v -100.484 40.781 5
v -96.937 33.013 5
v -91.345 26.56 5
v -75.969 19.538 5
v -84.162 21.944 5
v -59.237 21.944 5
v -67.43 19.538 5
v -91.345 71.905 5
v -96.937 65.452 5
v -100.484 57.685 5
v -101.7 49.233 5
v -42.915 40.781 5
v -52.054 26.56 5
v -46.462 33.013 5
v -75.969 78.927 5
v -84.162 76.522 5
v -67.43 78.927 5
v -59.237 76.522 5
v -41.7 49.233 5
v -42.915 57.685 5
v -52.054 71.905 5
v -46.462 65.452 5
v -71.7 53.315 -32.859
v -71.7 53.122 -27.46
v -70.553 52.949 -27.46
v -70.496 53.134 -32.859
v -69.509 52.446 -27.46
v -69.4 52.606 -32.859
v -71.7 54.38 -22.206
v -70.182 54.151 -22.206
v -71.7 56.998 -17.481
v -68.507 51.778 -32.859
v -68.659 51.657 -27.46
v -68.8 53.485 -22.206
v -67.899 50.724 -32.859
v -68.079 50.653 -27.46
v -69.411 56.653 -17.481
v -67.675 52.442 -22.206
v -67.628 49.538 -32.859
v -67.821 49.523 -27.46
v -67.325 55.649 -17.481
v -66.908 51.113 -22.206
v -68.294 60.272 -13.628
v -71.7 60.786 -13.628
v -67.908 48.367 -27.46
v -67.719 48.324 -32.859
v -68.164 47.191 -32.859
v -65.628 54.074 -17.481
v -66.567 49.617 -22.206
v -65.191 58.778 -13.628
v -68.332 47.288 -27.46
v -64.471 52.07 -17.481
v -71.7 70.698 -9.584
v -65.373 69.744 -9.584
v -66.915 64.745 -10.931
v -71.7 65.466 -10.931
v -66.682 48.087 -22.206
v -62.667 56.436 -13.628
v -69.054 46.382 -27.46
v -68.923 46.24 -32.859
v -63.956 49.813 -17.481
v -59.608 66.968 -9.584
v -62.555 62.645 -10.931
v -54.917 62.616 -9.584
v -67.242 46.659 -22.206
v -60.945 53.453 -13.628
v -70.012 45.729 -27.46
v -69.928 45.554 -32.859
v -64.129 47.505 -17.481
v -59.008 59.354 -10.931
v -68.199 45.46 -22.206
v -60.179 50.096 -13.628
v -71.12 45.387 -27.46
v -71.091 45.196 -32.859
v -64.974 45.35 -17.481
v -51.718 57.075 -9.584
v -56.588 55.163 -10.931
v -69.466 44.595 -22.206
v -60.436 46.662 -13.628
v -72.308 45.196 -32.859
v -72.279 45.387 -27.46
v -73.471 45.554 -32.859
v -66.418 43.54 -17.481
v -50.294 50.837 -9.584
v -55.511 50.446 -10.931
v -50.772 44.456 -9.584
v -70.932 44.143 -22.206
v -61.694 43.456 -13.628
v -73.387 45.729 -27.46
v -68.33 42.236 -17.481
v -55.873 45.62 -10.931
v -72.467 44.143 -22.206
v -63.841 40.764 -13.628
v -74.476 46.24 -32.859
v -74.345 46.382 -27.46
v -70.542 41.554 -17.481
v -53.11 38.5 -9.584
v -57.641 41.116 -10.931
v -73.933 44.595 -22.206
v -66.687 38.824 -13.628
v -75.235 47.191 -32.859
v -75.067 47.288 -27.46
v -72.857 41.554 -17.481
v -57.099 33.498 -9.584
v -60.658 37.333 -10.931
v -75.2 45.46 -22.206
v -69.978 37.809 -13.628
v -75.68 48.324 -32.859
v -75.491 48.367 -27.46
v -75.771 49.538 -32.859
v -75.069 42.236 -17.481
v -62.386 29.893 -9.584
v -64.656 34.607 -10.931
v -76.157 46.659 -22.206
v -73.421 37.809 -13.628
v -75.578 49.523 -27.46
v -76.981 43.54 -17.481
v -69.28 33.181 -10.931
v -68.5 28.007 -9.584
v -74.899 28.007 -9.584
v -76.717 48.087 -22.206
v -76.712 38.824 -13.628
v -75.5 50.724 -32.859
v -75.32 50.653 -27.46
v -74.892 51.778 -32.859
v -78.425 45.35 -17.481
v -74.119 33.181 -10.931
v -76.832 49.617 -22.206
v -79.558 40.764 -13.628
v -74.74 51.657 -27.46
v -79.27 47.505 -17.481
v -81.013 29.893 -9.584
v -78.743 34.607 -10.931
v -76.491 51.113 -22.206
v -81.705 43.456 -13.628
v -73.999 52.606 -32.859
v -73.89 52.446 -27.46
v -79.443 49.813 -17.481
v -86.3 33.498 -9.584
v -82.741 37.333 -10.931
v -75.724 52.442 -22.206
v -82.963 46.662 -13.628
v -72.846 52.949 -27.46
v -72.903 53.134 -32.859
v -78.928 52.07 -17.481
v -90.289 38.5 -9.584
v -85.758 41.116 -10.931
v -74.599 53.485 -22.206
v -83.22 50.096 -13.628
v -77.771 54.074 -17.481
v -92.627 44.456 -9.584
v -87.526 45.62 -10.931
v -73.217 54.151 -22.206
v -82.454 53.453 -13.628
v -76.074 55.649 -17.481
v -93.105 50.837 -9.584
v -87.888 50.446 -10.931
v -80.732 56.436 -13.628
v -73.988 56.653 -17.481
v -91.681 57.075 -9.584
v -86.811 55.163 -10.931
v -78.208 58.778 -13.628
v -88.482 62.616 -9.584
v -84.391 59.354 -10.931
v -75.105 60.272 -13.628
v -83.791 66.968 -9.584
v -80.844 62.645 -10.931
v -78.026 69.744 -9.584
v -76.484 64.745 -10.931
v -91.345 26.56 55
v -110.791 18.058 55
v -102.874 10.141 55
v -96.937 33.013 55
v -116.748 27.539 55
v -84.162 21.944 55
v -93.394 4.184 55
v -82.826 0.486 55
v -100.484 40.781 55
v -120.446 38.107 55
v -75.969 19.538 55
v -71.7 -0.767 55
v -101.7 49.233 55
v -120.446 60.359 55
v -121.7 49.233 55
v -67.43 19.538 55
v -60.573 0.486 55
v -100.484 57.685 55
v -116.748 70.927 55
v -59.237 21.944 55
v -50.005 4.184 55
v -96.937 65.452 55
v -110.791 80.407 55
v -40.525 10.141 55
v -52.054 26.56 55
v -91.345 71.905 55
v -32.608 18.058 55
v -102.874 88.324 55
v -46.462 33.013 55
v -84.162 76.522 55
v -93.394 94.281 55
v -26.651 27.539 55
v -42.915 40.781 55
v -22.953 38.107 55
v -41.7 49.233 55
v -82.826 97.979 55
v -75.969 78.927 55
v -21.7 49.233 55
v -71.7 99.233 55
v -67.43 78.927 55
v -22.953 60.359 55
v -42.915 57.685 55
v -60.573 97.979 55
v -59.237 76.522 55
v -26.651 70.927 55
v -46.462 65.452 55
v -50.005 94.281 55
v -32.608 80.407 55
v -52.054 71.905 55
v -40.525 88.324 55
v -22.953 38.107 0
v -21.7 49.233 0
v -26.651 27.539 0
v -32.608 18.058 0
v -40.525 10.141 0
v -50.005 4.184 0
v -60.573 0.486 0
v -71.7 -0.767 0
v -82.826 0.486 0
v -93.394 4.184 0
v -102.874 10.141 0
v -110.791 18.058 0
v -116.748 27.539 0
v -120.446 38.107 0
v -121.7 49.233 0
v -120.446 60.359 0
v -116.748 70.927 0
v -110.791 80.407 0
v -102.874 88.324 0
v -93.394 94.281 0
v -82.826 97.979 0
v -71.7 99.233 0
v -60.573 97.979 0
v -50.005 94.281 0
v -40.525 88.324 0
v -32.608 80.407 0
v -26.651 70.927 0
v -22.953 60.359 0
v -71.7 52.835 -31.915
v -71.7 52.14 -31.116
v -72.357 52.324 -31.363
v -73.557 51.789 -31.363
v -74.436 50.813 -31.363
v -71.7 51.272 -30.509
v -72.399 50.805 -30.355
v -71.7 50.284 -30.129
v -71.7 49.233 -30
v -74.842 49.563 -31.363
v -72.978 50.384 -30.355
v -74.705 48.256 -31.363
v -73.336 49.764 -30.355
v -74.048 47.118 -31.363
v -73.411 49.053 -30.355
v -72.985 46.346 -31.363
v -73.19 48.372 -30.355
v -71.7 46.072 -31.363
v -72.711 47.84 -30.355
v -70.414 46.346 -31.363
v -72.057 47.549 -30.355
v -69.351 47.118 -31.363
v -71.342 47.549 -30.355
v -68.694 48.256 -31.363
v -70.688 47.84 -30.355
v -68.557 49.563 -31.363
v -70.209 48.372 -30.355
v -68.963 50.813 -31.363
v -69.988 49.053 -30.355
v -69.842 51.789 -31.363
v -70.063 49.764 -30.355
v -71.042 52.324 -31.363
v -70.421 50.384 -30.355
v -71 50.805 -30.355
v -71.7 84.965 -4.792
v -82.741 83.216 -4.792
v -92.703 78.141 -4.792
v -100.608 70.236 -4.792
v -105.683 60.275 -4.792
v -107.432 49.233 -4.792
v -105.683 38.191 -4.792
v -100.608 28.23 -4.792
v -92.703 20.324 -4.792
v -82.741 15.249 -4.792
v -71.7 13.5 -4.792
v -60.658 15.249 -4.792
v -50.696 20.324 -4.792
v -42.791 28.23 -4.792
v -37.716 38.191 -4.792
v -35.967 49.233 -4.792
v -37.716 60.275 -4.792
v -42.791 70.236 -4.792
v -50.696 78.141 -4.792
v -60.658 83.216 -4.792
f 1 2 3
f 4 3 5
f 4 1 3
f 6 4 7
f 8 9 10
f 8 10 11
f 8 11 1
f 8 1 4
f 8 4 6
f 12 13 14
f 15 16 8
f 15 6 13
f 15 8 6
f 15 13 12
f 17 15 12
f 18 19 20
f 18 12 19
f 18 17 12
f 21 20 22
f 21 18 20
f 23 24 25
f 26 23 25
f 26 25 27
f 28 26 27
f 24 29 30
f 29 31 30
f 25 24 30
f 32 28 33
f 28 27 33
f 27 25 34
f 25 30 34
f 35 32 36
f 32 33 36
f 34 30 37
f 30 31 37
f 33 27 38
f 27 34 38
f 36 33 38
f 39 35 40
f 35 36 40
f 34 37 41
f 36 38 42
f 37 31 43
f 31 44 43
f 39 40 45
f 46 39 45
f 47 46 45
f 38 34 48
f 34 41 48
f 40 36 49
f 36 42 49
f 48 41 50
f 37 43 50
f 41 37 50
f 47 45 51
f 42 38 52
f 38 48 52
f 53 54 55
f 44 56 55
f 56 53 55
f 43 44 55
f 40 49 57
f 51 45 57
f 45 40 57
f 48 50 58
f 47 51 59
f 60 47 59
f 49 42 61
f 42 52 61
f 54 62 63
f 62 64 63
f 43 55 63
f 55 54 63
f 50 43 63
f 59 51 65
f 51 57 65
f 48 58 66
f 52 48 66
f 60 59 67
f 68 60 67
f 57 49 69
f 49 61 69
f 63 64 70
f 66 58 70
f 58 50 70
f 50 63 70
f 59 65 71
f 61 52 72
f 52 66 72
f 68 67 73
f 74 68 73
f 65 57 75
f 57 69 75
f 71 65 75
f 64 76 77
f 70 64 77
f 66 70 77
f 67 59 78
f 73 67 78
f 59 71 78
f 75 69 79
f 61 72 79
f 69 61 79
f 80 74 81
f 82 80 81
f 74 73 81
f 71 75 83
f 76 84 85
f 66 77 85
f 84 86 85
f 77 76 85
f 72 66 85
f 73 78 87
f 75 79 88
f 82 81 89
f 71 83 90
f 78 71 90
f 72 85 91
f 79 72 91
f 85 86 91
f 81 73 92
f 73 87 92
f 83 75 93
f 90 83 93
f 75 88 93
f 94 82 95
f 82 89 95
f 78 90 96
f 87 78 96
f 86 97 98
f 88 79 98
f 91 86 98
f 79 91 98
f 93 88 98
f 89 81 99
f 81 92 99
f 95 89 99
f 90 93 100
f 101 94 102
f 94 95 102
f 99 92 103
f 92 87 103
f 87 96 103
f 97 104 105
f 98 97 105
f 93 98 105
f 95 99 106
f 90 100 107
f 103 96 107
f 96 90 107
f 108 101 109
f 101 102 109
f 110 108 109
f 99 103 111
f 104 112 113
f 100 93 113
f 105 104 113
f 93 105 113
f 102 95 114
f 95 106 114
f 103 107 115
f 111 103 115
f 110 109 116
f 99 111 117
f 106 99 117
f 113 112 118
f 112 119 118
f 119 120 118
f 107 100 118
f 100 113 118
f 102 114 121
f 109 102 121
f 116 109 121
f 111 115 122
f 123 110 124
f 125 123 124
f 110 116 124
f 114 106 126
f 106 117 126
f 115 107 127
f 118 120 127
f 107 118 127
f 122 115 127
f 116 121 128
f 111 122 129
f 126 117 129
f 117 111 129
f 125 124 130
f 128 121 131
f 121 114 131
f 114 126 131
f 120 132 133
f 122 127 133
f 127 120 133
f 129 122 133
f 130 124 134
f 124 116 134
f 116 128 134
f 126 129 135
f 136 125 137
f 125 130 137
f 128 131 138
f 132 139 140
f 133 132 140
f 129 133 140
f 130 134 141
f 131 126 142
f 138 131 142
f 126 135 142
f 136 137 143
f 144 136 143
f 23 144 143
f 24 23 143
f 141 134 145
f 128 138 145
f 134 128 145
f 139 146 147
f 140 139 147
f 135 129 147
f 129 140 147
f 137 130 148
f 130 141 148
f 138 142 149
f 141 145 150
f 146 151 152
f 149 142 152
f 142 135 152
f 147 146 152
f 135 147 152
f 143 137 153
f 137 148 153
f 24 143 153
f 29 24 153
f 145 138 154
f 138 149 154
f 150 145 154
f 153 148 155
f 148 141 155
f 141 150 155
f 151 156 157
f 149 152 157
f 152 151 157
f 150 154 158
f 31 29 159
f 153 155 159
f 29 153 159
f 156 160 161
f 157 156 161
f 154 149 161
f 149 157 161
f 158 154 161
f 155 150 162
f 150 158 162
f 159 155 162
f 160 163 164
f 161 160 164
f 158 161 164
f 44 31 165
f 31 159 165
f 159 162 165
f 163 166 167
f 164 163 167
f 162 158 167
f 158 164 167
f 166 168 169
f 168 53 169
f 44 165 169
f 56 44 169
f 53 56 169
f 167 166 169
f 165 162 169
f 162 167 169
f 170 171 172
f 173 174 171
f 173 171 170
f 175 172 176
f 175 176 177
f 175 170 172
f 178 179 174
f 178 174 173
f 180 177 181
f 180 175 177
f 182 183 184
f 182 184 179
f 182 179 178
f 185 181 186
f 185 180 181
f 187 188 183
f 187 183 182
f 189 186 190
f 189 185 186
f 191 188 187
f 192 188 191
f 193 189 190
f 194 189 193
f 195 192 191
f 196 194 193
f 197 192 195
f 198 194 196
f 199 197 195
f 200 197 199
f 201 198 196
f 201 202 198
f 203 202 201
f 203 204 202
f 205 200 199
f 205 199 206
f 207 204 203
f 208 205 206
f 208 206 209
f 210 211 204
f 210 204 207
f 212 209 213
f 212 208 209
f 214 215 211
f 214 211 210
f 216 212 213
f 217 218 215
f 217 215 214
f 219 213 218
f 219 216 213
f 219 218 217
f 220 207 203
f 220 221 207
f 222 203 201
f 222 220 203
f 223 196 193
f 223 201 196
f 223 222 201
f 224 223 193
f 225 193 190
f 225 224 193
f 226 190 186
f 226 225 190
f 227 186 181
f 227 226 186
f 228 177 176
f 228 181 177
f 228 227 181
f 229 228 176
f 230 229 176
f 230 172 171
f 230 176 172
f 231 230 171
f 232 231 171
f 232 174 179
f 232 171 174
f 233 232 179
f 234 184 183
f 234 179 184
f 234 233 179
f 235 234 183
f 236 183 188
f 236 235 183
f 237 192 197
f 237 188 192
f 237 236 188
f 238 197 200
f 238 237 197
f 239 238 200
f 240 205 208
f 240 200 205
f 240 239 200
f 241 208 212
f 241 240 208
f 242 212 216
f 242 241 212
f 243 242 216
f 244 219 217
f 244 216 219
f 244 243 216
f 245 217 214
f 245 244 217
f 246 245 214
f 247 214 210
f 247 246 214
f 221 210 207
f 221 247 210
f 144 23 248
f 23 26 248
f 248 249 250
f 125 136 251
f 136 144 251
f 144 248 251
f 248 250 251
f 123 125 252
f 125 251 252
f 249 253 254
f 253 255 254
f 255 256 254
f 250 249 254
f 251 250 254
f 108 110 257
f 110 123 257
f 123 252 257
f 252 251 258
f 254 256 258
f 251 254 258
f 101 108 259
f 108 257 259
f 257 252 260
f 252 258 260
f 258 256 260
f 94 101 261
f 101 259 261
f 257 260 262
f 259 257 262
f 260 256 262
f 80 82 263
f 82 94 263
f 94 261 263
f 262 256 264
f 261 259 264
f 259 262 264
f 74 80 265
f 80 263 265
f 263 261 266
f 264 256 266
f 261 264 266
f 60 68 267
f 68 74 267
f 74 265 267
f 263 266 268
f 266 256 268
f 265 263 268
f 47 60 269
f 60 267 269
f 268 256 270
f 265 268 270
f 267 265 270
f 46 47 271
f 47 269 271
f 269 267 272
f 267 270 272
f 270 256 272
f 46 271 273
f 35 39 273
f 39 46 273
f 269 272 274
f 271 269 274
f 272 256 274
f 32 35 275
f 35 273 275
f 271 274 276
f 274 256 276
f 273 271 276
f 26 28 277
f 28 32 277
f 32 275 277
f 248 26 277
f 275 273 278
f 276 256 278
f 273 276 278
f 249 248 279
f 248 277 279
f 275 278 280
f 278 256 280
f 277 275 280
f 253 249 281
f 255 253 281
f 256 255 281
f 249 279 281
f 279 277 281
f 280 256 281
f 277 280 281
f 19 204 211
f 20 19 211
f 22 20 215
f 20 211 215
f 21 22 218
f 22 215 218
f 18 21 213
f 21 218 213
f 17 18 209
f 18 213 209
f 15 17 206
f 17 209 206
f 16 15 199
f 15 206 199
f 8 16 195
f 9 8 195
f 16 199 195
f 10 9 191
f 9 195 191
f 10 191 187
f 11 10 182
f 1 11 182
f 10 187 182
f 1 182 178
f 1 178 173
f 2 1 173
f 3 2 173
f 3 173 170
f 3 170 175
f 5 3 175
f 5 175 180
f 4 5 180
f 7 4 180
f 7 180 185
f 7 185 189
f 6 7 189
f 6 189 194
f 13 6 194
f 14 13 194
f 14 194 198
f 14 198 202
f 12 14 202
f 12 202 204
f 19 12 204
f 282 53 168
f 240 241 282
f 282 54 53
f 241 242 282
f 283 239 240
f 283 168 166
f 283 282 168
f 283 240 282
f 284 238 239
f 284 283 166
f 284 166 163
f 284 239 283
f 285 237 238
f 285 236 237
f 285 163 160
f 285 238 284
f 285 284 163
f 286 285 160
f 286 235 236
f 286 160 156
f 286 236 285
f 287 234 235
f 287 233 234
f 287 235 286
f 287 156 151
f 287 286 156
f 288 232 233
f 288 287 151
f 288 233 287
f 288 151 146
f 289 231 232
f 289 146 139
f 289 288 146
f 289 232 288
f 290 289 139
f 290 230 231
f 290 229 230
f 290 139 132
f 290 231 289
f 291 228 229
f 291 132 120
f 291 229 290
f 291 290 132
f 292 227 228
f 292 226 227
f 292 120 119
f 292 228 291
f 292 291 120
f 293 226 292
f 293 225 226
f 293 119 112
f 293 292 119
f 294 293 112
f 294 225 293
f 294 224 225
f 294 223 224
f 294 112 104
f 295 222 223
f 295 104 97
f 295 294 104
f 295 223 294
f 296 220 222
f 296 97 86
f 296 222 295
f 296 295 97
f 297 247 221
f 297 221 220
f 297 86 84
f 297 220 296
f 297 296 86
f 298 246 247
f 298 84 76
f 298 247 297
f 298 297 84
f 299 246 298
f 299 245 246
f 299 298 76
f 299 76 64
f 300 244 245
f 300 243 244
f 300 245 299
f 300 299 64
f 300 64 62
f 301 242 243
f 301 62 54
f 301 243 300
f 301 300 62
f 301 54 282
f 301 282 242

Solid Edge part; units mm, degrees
sketch "Sketch1" plane through (0, 0, 0) normal (0, 0, 1) x (1, 0, 0)
  circle A0 centre (-71.6995, 49.2327) radius 50
  dimension "D1" = 100
extrude "Protrusion1" add sketch "Sketch1" along normal blind 55
sketch "Sketch2" plane through (-71.6995, 49.2327, 55) normal (0, 0, 1) x (1, 0, 0)
  circle A0 centre (0, 0) radius 30
  dimension "D1" = 60
extrude "ExtrudedCutout_1" cut sketch "Sketch2" against normal blind 50
sketch "Sketch3" plane through (-71.6995, 0, 0) normal (1, 0, 0) x (0, 1, 0)
  line L0 (99.2327, 0) -> (49.2327, 0)
  arc A0 (53.3155, -32.8588) -> (49.2327, -30) centre (49.2327, -34.3448) ccw
  arc A1 (53.3155, -32.8588) -> (70.6979, -9.5837) centre (73.0225, -29.4481) cw
  line L1 (70.6979, -9.5837) -> (99.2327, 0)
  dimension "D1" = 50
  dimension "D2" = 4.3448
revolve "RevolvedProtrusion1" add sketch "Sketch3" angle 360 about axis through (-71.6995, 49.2327, 0) along (0, 0, -1)
properties material "Aluminum, 6061-T6"
